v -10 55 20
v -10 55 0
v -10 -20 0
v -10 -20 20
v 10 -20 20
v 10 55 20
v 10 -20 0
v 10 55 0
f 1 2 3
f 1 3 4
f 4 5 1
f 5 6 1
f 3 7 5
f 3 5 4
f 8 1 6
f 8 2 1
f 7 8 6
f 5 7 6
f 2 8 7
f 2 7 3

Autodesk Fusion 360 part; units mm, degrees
sketch "Sketch1" plane through (0, 0, 0) normal (0, 0, 1) x (1, 0, 0)
  line L0 (10, -45) -> (-10, -45)
  line L1 (-10, -45) -> (-10, 45)
  line L2 (-10, 45) -> (10, 45)
  line L3 (10, 45) -> (10, -45)
  line L4 (10, -45) -> (-10, 45) construction
  line L5 (-10, -45) -> (10, 45) construction
  dimension "d1" = 20
  dimension "d2" = 90
extrude "Extrude1" add sketch "Sketch1" along normal blind 20
extrude "Extrude2" add 1 faces at (-3.3333, 45, 6.6667) along direction (0, 1, 0) blind 10
extrude "Extrude3" cut 1 faces at (3.3333, -45, 6.6667) along direction (0, 1, 0) blind 39.2
extrude "Extrude4" add 1 faces at (3.3333, -5.8, 6.6667) along direction (0, -1, 0) blind 14.2
